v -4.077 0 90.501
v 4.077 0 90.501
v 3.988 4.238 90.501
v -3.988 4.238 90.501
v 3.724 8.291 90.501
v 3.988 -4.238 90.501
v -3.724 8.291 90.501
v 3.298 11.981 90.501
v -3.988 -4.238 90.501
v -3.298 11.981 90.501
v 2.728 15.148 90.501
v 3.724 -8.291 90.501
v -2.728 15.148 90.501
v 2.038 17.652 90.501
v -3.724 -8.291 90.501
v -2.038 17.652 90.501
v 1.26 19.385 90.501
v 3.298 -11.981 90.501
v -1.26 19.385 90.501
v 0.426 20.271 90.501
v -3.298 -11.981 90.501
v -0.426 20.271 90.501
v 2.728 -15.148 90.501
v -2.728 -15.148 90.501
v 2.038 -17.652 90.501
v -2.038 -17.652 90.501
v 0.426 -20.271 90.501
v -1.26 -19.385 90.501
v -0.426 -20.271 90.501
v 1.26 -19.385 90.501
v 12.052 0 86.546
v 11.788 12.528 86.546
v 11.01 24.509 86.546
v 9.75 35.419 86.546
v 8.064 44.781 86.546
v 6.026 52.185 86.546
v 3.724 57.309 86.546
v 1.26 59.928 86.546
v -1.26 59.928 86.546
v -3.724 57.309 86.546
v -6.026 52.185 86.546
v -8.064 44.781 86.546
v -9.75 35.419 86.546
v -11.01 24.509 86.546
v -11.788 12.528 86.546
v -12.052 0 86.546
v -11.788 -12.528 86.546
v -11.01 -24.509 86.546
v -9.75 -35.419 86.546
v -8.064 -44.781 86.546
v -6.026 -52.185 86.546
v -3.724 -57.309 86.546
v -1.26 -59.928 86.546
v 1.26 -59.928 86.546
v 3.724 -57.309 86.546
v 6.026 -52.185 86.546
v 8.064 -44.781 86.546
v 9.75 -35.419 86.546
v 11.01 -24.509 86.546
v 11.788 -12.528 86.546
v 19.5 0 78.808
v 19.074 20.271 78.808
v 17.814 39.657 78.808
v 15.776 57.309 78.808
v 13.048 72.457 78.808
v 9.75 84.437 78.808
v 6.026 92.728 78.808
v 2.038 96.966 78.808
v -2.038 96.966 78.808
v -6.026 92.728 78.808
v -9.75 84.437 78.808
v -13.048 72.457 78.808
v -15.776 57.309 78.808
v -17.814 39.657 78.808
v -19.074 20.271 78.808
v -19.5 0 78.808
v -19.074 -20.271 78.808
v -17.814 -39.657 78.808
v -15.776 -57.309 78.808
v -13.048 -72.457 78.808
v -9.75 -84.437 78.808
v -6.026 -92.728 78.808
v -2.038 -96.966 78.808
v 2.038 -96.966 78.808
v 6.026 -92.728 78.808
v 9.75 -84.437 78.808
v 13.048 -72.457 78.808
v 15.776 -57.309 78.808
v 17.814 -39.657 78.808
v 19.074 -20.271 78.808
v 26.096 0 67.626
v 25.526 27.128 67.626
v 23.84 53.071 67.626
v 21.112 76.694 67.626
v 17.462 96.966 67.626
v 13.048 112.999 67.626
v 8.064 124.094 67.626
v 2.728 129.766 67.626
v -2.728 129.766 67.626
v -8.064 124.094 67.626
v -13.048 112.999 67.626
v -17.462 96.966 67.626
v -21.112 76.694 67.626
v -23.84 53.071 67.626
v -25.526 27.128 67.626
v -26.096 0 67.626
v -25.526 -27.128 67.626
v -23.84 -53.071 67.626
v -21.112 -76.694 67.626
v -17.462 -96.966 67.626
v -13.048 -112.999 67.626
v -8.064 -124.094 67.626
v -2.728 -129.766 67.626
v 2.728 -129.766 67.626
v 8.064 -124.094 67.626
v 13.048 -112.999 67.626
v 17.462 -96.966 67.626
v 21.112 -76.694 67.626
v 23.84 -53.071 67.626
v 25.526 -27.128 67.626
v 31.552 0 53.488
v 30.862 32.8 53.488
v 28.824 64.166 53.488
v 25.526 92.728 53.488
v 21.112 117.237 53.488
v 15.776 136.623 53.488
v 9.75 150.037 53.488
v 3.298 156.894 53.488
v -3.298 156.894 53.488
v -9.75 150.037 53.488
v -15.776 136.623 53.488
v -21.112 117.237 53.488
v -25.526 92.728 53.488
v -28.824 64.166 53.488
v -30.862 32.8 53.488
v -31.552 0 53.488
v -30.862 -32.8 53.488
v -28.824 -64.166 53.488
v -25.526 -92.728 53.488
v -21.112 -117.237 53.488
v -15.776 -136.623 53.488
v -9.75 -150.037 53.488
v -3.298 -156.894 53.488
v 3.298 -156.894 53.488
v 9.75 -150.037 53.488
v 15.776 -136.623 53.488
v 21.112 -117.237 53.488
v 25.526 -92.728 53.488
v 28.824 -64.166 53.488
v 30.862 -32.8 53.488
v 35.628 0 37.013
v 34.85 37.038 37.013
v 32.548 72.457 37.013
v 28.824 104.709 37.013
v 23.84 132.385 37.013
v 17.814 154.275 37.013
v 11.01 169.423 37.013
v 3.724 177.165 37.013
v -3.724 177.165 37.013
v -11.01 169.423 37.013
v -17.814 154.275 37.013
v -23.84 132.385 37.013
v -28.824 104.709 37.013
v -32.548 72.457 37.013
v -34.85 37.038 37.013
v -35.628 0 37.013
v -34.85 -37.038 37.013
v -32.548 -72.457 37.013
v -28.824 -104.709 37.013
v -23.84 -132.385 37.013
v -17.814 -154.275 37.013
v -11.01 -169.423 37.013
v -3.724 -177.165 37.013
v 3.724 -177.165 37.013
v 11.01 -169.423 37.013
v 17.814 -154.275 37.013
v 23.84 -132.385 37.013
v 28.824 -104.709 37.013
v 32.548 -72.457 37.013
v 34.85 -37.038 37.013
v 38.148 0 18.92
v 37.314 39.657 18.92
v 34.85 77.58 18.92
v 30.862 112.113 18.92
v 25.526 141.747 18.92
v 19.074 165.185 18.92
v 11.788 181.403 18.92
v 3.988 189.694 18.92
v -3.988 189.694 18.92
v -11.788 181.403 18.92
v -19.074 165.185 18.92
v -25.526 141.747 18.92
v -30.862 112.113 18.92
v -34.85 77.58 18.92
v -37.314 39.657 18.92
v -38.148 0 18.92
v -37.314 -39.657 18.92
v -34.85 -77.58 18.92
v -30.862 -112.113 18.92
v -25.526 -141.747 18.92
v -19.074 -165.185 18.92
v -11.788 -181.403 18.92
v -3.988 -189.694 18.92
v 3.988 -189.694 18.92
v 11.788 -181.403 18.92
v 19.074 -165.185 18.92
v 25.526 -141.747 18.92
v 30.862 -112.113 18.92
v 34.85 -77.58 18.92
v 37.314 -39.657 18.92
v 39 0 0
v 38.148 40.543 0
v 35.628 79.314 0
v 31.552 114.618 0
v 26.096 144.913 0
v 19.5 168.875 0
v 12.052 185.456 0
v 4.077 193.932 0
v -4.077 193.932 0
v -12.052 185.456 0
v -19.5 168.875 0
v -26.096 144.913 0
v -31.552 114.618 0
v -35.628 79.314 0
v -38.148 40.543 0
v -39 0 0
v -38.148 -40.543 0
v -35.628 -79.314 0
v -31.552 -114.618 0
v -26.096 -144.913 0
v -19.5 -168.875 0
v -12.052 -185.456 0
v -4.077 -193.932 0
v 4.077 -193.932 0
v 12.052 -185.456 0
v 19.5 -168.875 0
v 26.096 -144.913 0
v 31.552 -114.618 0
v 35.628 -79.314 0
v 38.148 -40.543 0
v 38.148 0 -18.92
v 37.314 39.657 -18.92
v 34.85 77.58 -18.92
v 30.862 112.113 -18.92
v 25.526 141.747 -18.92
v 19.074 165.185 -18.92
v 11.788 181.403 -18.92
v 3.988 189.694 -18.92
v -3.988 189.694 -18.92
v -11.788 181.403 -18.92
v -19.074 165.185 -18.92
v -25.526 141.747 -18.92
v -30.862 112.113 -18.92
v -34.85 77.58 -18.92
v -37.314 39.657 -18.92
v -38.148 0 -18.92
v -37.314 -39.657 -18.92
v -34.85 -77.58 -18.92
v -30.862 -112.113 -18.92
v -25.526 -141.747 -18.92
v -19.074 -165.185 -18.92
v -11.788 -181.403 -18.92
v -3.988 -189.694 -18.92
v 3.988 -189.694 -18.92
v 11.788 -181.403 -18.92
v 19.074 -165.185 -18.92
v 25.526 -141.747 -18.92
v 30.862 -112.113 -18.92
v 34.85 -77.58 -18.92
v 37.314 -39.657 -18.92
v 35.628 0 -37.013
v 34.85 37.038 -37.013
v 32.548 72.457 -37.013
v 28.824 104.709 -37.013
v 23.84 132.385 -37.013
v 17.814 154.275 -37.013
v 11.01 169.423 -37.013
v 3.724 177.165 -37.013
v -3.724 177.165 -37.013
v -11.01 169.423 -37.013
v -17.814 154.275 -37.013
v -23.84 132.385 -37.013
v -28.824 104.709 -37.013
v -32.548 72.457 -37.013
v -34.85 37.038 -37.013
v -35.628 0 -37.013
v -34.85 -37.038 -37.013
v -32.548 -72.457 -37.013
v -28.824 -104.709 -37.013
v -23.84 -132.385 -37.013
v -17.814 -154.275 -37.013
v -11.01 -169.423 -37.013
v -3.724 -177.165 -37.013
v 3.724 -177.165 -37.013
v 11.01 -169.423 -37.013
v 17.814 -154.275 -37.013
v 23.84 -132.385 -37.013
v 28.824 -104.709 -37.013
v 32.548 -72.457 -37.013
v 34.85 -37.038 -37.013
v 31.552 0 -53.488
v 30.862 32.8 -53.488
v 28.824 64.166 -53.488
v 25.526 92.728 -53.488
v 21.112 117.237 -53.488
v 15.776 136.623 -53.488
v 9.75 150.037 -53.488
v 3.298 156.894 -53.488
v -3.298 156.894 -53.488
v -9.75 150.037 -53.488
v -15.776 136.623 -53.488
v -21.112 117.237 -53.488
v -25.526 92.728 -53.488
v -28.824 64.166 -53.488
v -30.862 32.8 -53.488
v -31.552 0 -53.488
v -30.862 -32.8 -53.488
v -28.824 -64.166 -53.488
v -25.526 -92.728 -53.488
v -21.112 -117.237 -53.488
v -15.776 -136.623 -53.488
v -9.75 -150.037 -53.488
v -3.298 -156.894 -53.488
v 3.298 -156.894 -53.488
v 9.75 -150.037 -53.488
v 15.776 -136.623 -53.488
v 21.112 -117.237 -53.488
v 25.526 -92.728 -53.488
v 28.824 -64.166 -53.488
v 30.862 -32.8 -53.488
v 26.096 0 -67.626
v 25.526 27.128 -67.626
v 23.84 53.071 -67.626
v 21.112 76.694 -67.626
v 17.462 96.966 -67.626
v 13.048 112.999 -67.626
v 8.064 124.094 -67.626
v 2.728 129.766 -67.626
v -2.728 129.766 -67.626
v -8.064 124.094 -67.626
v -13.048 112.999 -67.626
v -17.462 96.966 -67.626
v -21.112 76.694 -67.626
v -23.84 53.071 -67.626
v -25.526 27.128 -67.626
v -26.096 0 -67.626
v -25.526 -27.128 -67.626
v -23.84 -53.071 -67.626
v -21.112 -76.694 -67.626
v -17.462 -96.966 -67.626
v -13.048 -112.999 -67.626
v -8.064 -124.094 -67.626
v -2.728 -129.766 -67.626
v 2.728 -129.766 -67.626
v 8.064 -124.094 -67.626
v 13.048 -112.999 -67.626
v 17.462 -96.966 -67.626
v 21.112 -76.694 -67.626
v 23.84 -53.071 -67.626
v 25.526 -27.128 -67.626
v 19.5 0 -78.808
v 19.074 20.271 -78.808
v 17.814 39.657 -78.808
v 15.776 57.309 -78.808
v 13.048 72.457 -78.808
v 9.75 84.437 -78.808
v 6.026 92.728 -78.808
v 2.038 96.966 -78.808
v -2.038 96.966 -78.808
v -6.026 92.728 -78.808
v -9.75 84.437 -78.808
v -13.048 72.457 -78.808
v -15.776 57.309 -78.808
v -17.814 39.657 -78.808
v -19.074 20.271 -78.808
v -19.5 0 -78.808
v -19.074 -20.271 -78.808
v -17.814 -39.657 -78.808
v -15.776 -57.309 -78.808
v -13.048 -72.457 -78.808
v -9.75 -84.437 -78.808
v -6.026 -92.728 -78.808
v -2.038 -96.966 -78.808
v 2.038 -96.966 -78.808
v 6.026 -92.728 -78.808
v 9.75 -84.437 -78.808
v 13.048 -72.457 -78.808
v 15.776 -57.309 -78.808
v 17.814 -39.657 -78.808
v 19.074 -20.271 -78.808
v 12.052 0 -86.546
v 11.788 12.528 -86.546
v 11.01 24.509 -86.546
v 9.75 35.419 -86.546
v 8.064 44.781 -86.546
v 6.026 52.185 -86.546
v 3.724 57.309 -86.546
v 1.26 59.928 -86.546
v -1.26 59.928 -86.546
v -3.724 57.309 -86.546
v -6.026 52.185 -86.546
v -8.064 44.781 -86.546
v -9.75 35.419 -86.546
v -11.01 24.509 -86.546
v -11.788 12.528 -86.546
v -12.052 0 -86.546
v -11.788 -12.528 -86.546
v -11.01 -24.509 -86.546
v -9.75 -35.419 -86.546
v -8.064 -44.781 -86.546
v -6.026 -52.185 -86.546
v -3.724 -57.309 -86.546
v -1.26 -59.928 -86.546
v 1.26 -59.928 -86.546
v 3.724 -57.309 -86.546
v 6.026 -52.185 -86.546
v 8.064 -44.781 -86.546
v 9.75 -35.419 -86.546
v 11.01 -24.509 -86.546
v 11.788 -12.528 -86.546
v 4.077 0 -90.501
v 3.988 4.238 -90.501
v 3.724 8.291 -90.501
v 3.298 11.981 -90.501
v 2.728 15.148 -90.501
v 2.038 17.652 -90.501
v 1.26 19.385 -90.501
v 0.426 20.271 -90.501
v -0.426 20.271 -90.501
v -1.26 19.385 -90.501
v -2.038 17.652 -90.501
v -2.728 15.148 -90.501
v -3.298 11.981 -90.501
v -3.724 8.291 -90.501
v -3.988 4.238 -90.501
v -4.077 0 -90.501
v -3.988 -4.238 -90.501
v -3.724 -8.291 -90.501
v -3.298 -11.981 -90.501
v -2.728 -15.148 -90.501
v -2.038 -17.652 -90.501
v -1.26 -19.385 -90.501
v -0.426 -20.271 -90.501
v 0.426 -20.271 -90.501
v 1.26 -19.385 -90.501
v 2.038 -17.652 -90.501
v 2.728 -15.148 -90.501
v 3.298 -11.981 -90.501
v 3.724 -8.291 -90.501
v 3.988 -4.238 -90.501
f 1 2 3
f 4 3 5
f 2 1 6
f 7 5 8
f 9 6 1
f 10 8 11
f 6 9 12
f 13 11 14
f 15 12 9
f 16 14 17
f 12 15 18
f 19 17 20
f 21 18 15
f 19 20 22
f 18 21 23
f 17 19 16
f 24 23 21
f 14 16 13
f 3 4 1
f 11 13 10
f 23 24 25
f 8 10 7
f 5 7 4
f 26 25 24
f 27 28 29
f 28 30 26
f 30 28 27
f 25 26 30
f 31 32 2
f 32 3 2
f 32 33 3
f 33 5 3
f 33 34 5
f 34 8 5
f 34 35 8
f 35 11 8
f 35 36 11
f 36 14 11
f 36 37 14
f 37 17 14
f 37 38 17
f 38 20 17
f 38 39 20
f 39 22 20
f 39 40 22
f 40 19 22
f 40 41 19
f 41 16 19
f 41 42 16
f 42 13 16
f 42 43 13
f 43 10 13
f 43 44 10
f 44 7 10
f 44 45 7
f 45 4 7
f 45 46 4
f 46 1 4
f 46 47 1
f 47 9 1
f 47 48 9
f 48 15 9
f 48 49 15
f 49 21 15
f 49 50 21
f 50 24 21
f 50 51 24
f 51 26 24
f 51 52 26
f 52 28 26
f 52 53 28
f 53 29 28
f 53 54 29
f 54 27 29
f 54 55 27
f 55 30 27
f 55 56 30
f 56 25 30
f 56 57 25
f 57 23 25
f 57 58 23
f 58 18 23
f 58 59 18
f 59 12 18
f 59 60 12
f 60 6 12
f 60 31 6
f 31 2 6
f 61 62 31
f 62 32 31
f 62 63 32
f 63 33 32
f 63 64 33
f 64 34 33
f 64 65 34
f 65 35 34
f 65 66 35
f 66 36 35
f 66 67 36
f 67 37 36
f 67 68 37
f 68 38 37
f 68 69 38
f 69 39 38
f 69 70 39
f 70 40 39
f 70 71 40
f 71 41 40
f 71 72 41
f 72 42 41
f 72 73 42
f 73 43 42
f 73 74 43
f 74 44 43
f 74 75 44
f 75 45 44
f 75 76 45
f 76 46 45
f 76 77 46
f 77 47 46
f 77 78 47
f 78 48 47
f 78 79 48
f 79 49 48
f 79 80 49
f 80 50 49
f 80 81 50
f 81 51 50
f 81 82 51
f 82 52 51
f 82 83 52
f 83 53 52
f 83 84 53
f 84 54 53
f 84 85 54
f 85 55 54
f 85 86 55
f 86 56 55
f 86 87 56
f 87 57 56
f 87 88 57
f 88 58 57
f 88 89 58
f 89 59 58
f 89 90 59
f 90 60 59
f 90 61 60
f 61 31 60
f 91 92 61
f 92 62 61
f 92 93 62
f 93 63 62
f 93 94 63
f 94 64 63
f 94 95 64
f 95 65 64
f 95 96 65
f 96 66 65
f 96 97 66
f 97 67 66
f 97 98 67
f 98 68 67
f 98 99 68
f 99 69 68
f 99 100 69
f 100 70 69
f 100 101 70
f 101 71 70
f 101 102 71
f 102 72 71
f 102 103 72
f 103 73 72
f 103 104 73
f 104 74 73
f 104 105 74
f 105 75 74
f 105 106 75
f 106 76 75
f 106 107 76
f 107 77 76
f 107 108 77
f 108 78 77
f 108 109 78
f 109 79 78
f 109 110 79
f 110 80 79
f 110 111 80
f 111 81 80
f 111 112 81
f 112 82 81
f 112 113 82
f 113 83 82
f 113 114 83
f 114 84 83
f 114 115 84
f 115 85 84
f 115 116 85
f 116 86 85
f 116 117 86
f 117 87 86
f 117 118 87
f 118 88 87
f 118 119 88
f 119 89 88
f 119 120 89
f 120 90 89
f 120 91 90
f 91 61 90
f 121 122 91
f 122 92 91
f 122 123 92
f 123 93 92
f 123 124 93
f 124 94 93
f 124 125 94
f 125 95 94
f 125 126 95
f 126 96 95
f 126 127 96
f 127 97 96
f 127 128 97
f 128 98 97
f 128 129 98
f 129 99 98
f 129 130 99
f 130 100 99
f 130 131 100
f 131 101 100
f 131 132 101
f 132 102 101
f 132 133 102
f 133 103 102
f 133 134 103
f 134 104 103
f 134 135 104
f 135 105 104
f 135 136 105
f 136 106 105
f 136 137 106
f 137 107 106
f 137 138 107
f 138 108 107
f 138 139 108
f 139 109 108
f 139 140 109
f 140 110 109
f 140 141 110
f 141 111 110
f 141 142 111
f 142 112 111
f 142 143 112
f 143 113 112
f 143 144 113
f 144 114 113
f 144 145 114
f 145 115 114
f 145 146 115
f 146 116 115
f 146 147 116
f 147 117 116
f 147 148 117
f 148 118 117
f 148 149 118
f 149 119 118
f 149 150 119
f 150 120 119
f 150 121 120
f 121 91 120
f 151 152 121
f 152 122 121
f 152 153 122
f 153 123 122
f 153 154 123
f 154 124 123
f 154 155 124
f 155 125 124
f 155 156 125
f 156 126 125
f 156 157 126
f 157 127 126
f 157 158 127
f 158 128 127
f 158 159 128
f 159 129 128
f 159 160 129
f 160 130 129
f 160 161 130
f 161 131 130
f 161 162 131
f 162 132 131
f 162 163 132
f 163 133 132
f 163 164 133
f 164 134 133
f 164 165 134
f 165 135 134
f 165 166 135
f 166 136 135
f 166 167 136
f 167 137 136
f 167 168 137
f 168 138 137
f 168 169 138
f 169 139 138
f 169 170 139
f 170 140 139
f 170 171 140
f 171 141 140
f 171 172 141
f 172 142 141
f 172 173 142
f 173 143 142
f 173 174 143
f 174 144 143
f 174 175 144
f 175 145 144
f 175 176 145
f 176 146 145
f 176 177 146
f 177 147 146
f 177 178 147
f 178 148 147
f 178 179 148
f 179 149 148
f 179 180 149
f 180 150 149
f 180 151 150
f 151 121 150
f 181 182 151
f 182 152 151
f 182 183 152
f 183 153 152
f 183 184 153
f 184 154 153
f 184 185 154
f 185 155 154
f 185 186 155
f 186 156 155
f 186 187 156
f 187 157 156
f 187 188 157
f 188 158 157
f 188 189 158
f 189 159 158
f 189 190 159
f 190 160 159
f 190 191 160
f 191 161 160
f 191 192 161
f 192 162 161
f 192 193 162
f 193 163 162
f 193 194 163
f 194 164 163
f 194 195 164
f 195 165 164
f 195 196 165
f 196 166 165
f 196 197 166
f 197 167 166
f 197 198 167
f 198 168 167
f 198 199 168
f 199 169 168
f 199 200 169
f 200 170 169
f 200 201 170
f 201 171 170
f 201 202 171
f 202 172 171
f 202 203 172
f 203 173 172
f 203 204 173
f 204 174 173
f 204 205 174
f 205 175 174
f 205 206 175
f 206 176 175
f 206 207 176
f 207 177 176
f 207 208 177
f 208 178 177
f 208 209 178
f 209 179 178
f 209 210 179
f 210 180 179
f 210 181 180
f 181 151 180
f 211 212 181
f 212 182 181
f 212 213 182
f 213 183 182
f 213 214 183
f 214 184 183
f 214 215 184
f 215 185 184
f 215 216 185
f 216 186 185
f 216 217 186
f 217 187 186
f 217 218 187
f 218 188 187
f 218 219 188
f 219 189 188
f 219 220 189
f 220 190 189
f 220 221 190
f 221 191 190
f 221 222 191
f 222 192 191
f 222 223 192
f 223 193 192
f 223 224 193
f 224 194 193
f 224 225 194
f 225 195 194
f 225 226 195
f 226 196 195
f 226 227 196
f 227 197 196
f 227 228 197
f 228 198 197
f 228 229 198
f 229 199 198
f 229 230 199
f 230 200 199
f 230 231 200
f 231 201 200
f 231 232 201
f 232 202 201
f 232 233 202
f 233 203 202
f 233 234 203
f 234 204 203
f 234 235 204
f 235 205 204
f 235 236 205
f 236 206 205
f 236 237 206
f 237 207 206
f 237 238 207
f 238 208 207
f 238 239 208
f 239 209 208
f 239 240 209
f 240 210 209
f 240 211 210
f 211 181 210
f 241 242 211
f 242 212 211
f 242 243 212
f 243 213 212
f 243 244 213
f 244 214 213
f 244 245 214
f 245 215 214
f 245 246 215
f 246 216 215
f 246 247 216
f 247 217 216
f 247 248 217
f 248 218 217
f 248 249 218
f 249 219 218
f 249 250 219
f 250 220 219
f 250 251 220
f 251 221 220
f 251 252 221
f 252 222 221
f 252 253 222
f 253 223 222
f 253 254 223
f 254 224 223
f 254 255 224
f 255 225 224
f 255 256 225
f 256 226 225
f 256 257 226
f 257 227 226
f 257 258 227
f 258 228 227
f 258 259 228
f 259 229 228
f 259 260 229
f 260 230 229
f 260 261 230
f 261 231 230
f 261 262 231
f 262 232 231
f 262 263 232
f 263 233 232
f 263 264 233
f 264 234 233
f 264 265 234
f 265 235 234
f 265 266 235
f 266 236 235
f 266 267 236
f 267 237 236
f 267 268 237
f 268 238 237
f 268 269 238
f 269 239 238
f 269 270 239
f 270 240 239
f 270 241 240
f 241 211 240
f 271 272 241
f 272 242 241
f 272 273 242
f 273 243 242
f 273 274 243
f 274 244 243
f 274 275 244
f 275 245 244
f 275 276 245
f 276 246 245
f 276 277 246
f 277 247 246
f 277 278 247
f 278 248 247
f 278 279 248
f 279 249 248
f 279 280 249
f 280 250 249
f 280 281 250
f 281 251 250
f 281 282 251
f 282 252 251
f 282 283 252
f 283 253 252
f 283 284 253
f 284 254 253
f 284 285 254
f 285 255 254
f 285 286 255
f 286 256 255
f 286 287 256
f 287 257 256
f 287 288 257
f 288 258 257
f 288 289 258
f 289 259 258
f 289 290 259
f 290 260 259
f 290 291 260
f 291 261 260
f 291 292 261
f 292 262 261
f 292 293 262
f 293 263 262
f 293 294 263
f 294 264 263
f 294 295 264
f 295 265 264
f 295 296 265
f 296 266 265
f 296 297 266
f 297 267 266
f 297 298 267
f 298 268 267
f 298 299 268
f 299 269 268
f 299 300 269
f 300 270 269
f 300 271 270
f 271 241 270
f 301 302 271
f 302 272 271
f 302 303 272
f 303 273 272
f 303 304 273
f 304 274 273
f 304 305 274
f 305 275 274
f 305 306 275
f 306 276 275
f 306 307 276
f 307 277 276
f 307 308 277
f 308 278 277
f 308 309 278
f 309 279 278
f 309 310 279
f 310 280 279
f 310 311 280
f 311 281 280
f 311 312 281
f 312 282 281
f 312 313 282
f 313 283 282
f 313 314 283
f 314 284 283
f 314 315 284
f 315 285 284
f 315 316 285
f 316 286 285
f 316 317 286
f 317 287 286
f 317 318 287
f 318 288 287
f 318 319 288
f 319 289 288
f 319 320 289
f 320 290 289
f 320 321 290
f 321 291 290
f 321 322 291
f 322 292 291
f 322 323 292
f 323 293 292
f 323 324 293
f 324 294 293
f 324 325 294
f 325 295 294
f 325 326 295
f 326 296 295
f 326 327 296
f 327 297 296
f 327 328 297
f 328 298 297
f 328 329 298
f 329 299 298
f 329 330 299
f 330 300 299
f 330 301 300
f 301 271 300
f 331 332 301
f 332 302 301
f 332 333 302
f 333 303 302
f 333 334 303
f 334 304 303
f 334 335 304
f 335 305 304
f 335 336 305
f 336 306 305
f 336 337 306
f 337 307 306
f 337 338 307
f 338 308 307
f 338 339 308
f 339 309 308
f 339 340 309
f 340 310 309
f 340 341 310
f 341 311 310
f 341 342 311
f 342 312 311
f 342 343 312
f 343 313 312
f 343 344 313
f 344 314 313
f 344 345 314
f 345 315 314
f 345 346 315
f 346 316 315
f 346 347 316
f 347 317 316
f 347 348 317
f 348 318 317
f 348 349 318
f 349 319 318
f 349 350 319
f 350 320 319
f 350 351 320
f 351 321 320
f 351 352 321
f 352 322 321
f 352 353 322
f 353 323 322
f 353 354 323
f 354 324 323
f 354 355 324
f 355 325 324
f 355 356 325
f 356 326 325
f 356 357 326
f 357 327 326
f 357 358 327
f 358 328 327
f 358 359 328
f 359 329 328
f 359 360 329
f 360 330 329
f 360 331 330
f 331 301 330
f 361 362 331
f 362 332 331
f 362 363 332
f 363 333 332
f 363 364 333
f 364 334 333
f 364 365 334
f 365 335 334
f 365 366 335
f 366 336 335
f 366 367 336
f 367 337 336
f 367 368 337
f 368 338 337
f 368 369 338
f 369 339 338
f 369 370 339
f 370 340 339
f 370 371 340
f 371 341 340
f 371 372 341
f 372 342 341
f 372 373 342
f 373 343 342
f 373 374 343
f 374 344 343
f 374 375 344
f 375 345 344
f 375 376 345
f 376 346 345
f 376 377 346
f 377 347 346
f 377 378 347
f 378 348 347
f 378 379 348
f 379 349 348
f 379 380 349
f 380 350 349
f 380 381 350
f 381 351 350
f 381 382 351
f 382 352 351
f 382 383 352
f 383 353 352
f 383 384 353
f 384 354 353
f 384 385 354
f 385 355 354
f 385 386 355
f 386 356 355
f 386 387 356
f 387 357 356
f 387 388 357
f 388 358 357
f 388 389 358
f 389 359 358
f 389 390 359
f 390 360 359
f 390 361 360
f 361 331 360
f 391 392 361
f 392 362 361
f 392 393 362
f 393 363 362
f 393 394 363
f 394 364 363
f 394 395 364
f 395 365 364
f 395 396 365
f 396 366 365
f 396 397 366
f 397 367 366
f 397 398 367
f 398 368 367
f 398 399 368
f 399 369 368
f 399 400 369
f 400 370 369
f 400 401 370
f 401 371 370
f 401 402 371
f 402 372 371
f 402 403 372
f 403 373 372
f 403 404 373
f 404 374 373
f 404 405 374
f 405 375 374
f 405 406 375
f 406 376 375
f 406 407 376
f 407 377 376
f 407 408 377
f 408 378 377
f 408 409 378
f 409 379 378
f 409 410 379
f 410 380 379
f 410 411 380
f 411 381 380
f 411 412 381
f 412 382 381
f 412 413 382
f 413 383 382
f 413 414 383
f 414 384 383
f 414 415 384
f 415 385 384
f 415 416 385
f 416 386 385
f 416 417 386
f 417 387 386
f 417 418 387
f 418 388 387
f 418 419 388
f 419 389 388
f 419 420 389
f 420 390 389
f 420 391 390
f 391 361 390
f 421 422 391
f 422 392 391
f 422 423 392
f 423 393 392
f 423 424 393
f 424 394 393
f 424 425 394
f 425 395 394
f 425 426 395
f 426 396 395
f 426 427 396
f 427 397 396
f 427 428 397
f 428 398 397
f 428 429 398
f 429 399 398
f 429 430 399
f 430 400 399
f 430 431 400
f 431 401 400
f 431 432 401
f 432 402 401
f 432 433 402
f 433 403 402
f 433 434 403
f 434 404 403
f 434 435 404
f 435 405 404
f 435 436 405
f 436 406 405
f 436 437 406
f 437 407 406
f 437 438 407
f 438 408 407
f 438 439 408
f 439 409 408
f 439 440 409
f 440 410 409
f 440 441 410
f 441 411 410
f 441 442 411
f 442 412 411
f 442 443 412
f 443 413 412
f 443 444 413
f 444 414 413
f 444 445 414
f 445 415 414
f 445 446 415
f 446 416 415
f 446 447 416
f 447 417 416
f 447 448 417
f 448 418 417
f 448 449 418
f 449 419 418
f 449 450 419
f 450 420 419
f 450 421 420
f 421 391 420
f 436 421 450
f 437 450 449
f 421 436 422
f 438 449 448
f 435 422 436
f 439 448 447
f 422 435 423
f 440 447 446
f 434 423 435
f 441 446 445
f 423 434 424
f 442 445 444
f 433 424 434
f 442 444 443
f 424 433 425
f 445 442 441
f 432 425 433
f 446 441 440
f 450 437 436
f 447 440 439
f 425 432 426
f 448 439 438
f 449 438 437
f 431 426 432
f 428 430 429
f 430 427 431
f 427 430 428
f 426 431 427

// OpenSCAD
// Generated by SolidPython 1.0.1 on 2020-07-29 00:46:45


scale(v = [3, 15, 7]) {
	sphere(r = 13);
}
/***********************************************
*********      SolidPython code:      **********
************************************************
 
# import packages: SolidPython
from solid import *
from solid.utils import *
from itertools import chain, combinations, permutations


class Resize:

    def __init__(self, scad_file):
        self.scad_file = scad_file
        #self.scad_file = import_scad(scad_file)
        # cone/cylinder param:
        self.r1 = 0
        self.r2 = 0
        self.h = 0
        # rectangular prism param:
        self.w = 0
        self.l = 0
        # ellipse param:
        self.r = 0

    # import OpenScad code (file name corresponds to shape)


    # classify shape + parameters
    def assign(self, param1, param2, param3):
        if self.scad_file == 'cone.scad':
            self.r1 = param1
            self.r2 = param2
            self.h = param3
        elif self.scad_file == 'cylinder.scad':
            self.r1 = param1
            self.r2 = param2
            self.h = param3
        elif self.scad_file == 'rectangularPrism.scad':
            self.h = param1
            self.l = param2
            self.w = param3
        else:
            self.r = param1
            self.h = param2

    # resize parameters
    def iterate(self):
        x = range(3, 20, 2)
        i = 1
        if self.scad_file == 'cone.scad':
            tempList = list(permutations(x, 2))
            for temp in tempList:
                param1 = temp[0]
                param2 = temp[1]
                filepath = 'produced_scad_files/' + 'cone' + str(param1) + '_' + str(param2) + '_' + '.scad'
                scad_render_to_file(cylinder(h=param1, r1=param2, r2=0), filepath)

        elif self.scad_file == 'cylinder.scad':
            tempList = list(permutations(x, 3))
            for temp in tempList:
                param1 = temp[0]
                param2 = temp[1]
                filepath = 'produced_scad_files/' + 'cylinder' + str(param1) + '_' + str(param2) + '_' + '.scad'
                scad_render_to_file(cylinder(h=param1, r1=param2, r2=param2), filepath)

        elif self.scad_file == 'rectangularPrism.scad':
            tempList = list(permutations(x, 3))
            for temp in tempList:
                param1 = temp[0]
                param2 = temp[1]
                param3 = temp[2]
                filepath = 'produced_scad_files/' + 'rectangularPrism' + str(param1) + '_' + str(param2) + '_' + str(
                    param3) + '.scad'
                scad_render_to_file(cube(size=(param1, param2, param3)), filepath)

        elif self.scad_file == 'ellipse.scad':
            tempList = list(permutations(x, 4))
            for temp in tempList:
                param1 = temp[0]
                param2 = temp[1]
                param3 = temp[2]
                param4 = temp[3]
                filepath = 'produced_scad_files/' + 'ellipse' + str(param1) + '_' + str(param2) + '_' + str(param3) + '_' + str(param4) + '.scad'
                scad_render_to_file(scale([param1, param2, param3])(sphere(r=param4)), filepath)

    def render_to_scadfile(self):
        scad_render_to_file(scad, 'example.scad') 
 
************************************************/
